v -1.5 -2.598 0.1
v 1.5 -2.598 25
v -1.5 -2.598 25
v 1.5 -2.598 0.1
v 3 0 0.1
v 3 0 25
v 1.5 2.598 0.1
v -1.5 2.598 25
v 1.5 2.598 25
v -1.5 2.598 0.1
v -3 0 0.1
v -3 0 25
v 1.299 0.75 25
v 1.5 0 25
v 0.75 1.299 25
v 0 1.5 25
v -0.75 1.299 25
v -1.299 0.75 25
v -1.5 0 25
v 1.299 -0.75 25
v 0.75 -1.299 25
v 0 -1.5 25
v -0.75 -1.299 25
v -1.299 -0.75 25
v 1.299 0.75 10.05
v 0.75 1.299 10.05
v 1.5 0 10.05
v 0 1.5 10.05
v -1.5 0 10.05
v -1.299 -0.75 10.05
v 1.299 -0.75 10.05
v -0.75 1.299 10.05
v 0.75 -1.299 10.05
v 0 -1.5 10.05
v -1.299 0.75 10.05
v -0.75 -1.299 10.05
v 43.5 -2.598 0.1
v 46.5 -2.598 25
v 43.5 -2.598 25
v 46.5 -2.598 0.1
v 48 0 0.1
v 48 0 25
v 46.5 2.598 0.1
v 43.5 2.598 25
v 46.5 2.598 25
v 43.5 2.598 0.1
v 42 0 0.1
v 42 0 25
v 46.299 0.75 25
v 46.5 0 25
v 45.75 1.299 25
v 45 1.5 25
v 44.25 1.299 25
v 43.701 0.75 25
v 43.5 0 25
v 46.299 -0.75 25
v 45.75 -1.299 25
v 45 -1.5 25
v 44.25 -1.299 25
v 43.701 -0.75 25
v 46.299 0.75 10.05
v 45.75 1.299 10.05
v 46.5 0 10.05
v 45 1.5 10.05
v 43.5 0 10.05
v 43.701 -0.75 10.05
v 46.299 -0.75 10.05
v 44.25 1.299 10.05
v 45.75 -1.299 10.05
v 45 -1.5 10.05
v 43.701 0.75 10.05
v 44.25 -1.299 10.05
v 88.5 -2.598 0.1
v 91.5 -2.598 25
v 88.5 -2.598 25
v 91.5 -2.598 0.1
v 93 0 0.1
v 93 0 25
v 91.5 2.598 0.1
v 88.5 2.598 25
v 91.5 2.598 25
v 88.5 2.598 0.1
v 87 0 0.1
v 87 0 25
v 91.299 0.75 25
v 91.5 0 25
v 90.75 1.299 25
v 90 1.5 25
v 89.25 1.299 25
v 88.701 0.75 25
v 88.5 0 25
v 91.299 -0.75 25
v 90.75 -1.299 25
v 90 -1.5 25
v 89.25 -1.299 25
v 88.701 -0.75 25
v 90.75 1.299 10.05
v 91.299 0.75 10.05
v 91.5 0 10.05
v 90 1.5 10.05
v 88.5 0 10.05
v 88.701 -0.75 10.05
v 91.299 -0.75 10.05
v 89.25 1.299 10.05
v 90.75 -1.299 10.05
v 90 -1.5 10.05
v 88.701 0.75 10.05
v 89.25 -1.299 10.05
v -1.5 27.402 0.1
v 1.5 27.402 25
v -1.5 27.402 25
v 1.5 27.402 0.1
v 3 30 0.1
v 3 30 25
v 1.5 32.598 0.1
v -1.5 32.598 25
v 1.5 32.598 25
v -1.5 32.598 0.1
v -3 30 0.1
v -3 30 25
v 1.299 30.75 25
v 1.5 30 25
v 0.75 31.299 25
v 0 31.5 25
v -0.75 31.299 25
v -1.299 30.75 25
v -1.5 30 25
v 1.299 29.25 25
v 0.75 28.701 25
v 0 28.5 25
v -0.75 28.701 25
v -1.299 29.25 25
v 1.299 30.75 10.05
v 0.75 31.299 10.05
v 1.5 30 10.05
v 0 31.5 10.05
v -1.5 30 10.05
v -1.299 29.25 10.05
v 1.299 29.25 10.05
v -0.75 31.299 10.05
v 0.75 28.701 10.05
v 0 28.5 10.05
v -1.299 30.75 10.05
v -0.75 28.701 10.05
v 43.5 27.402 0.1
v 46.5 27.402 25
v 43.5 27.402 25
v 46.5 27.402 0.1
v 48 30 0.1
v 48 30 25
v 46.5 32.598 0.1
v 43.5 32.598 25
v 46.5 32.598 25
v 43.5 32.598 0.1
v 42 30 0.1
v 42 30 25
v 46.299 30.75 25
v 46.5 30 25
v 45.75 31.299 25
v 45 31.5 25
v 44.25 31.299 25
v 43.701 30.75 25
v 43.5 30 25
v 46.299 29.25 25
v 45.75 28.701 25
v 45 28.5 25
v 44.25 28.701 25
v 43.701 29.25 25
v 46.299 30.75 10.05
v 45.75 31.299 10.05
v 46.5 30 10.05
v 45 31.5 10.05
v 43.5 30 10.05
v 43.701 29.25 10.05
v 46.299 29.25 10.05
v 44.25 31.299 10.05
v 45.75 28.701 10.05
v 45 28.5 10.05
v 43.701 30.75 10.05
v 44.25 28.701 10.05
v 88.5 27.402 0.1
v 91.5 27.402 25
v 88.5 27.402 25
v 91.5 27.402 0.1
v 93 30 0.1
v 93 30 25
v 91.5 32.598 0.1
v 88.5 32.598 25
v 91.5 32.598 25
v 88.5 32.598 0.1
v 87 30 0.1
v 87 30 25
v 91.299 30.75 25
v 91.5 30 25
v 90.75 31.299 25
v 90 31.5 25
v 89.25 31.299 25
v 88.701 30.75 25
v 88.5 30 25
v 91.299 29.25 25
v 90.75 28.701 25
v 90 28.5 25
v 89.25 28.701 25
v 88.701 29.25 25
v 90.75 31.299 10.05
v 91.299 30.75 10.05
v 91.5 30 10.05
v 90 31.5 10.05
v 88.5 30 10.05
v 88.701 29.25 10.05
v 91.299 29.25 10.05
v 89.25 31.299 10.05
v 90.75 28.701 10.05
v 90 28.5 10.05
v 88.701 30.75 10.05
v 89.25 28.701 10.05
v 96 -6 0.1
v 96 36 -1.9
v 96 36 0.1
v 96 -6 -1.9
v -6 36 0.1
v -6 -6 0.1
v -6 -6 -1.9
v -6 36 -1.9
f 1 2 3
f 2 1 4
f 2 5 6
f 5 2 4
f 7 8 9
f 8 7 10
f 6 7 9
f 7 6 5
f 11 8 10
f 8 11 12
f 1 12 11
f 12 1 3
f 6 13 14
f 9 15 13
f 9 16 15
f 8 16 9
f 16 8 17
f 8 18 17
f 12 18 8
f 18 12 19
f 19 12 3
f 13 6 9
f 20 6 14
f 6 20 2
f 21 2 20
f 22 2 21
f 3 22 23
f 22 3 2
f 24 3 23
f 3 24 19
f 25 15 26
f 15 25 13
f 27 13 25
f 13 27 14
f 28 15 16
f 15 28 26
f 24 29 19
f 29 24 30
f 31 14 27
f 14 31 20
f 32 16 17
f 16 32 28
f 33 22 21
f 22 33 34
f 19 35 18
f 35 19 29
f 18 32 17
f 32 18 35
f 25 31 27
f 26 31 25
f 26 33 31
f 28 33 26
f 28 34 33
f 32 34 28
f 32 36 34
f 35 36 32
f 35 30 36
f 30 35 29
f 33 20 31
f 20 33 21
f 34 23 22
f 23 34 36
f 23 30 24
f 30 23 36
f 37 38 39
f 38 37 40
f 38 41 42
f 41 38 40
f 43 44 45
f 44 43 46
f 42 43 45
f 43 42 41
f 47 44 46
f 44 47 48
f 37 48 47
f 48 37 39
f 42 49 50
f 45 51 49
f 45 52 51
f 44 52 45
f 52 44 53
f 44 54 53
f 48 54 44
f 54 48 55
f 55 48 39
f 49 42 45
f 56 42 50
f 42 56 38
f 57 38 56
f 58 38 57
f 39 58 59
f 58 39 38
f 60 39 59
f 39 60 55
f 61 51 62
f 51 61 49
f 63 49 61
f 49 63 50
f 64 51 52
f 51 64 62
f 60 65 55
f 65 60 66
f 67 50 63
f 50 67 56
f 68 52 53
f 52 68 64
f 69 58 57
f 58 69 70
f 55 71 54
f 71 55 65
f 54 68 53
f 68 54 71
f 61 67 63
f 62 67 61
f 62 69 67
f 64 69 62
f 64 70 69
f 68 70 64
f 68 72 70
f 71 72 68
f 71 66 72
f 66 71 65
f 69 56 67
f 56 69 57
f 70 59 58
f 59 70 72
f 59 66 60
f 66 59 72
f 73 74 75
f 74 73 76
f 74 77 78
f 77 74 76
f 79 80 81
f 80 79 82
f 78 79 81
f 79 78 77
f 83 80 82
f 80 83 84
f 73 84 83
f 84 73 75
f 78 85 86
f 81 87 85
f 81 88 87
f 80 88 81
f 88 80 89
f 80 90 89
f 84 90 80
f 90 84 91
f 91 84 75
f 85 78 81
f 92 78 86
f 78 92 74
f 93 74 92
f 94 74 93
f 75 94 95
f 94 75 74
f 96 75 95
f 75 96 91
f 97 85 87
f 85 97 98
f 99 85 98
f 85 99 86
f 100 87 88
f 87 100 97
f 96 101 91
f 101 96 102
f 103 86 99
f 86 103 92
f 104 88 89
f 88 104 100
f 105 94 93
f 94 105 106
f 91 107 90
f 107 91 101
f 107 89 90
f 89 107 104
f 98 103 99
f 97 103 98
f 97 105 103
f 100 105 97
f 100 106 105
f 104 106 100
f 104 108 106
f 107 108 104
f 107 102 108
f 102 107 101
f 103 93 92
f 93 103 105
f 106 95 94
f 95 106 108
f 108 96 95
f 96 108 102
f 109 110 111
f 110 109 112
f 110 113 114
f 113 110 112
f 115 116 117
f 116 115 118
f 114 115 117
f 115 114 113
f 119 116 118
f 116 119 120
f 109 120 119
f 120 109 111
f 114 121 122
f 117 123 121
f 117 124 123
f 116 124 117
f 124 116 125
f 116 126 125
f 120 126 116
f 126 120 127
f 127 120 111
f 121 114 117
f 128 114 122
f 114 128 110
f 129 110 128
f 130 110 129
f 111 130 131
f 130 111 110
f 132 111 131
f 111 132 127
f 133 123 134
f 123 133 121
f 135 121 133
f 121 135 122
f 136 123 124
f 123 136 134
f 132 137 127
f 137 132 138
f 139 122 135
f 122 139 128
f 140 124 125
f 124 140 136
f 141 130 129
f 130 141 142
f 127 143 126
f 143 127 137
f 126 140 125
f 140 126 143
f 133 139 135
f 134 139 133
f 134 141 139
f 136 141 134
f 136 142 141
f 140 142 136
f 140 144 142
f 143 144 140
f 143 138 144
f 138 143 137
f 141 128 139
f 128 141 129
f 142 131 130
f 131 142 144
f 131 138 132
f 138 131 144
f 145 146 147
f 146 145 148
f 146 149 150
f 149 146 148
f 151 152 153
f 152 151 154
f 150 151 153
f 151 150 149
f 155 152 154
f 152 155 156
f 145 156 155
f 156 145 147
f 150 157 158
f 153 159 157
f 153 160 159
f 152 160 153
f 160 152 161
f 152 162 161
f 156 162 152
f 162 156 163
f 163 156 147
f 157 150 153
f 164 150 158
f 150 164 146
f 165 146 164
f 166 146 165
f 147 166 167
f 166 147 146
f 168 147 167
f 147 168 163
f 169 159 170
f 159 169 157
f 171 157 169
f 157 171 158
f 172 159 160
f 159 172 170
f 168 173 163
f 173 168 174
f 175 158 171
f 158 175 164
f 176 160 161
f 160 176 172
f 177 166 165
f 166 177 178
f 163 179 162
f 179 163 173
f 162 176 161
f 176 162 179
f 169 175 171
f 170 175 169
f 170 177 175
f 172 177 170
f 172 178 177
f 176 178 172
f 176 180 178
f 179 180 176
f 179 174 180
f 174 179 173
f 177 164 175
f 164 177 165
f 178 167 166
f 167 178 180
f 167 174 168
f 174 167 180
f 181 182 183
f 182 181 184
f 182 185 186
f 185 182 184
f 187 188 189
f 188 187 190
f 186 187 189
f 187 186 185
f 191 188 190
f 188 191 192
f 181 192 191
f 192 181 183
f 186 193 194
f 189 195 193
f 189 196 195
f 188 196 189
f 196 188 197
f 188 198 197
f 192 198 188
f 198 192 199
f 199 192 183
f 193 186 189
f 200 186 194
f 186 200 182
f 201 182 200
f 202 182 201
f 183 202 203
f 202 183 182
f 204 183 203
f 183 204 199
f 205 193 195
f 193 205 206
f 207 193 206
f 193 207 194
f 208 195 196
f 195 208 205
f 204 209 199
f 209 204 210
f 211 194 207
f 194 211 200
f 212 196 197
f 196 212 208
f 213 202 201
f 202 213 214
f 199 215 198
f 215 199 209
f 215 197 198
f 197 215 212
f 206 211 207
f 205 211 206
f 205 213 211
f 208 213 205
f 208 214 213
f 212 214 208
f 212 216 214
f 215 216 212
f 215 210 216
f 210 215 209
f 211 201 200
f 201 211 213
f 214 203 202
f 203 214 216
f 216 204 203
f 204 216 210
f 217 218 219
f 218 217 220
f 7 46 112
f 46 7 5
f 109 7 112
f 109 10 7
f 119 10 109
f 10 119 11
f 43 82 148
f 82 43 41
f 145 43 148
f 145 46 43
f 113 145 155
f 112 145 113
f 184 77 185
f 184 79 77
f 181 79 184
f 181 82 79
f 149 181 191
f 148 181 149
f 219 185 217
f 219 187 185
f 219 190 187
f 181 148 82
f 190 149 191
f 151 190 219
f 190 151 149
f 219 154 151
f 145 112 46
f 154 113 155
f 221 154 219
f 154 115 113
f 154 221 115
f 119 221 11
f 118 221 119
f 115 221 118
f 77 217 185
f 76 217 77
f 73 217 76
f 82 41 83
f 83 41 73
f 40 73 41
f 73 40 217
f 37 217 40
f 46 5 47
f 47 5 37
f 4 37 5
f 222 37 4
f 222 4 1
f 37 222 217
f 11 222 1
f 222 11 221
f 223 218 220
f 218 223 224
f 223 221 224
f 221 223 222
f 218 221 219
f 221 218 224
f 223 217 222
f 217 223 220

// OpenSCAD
//Standoff Customizer v0.0.8 
//by eriqjo February 20, 2015

//REVISION HISTORY
//v1.0  Fix issues with customizer
//v0.0.8 Increased max height to 45, added option for hole/flat top
//V0.0.7 A different approach to making an array of standoffs
//v0.0.6 Added option for array of standoffs
//v0.0.5 Added feature for rectangular foot on bottom of standoff
//v0.0.4 Changed all cylinders to radius based
//v0.0.1 Initial release of standoff customizer

//CUSTOMIZER VARIABLES

/* [Body Parameters] */

//Type of standoff(s) to create
Style = 2; // [1:Single, 2:Array]

//Choose shape of the main body
Body_Shape = 3; // [1:Round, 2:Square, 3:Hex]

//Define the height of the body, mm
Body_Height = 25; // [3:45]

//Define the diameter of the body, mm
Body_Diameter = 6;

//Choose the style of the top section
Top_Style = 2; //[1:Male, 2:Female, 3:Flat]

//Outer diameter of threaded portion, mm
Thread_Dia = 3;

//Define the height/depth of the top feature, mm
Thread_Height = 15;

//Define thickness of the base, mm
Base_Thickness = 2;


/* [Single Options] */

//Features to include on base
Base_Type = 3; // [1:Hole Only, 2:Rectangular Base Only, 3:Base and Hole, 4:Neither]

//Define the diameter of the bottom clearance hole, mm
Bottom_Hole_Dia = 3;

//Define length in x-direction, mm
Base_X = 12;

//Define length in y-direction, mm
Base_Y = 35;

/* [Array Options] */

//Number of columns, x-direction
Columns = 3;

//Center-to-Center distance for columns, mm
X_Offset = 45;

//Number of rows, y-direction
Rows = 2;

//Center-to-Center distance for rows, mm
Y_Offset = 30;

//How far past the edge of the standoffs the base extends, mm
Added_Base = 3;

//CUSTOMIZER VARIABLES END

bodyR = Body_Diameter/2;
bottomR = Bottom_Hole_Dia/2;
threadR = Thread_Dia/2;


module makeBody(shape) {

//round************************************************************************************************
	if(shape == 1) {	//round
		if(Top_Style == 1){   //male
			union(){
				translate([0, 0, Body_Height/2])
					cylinder(Body_Height, r = bodyR, center = true, $fn = 12);
				translate([0,0, Body_Height + Thread_Height/2 - 0.1])
					cylinder(Thread_Height + 0.1, r = threadR, $fn = 12, center = true);
			} //u
		}// if topstyle = 1
		
				if(Top_Style == 2){   //female
			difference(){
				translate([0, 0, Body_Height/2])
					cylinder(Body_Height, r = bodyR, center = true, $fn = 12);
				translate([0,0, Body_Height - Thread_Height/2 + 0.1])
					cylinder(Thread_Height + 0.1, r = threadR, $fn = 12, center = true);
			} //d
		}// if topstyle = 2
		
		if(Top_Style == 3){   //flat
			translate([0, 0, Body_Height/2])
				cylinder(Body_Height, r = bodyR, center = true, $fn = 12);							
		}// if topstyle = 3	
				
	} //if
	
	
//square****************************************************************************************************
	if(shape == 2) {	//square
		if(Top_Style == 1){  //male
			union(){
				translate([0,0, Body_Height + Thread_Height/2 - 0.1])
					cylinder(h = Thread_Height + 0.1, r = threadR, $fn = 12, center = true);
				translate([0,0, Body_Height/2])
					cube([Body_Diameter, Body_Diameter, Body_Height], center = true);
			} //u
		} //if topstyle = 1
		
		if(Top_Style == 2){  //female
			difference(){
				translate([0,0, Body_Height/2])
					cube([Body_Diameter, Body_Diameter, Body_Height], center = true);
				translate([0,0, Body_Height - Thread_Height/2 + 0.1])
					cylinder(h = Thread_Height + 0.1, r = threadR, $fn = 12, center = true);
			} //d
		} //if topstyle = 2		
		
		if(Top_Style == 3){  //flat
			translate([0,0, Body_Height/2])
				cube([Body_Diameter, Body_Diameter, Body_Height], center = true);
		} //if topstyle = 3	
		
	} //if square
	
	
//hex**********************************************************************************************************
	if(shape == 3) {	//hex
		if(Top_Style == 1){  //male
			union(){
				translate([0,0, Body_Height + Thread_Height/2 - 0.1])
					cylinder(h = Thread_Height + 0.1, r = threadR, $fn = 12, center = true);
				cylinder(h = Body_Height, r = bodyR, center = false, $fn = 6);
			} //u
		} // if topstyle = 1
		
		if(Top_Style == 2){  //female
			difference(){
				cylinder(h = Body_Height, r = bodyR, center = false, $fn = 6);
				translate([0,0, Body_Height - Thread_Height/2 + 0.1])
					cylinder(h = Thread_Height + 0.1, r = threadR, $fn = 12, center = true);
			} //u
		} // if topstyle = 2
		
		if(Top_Style == 3){ // flat
			cylinder(h = Body_Height, r = bodyR, center = false, $fn = 6);
		}//if topstyle = 3
	} //if hex
	
	
} //module

module makeBase(){
	if(Base_Type == 2 || Base_Type == 3){
	 translate([0, 0, Base_Thickness/2])
		cube([Base_X, Base_Y, Base_Thickness], center = true);	
	} //if
} //module

module makeHole(){
	if(Base_Type == 1 || Base_Type == 3){
		translate([0, 0, (Body_Height - 1)/2])
			cylinder(h = Body_Height - 0.9, r = bottomR, $fn = 12, center = true);
	} //if
} //module

//Runtime
if (Style == 1){   //single standoff
	difference(){
		union(){
			makeBody(Body_Shape);
			makeBase();
		} //u
		makeHole();
	} //d
} //if



//The new way

baseShift = Body_Diameter/2 + Added_Base;
baseX = (Columns - 1) * X_Offset + Body_Diameter + (2 * Added_Base);
baseY = (Rows - 1) * Y_Offset + Body_Diameter + (2 * Added_Base);

if (Style == 2){  //array

	union(){
		for (j = [0 : Rows - 1]){     //replace 3 with Rows
			translate([0,j * Y_Offset,0])
				for( i = [0 : Columns - 1]){   //replace 4 with Columns
					translate([i * X_Offset,0,0])
						makeBody(Body_Shape);
				}//for
		}//for
		translate([-baseShift, -baseShift, -Base_Thickness + 0.1])
			cube(size = [baseX, baseY, Base_Thickness], center = false);
	} //union
}//if
